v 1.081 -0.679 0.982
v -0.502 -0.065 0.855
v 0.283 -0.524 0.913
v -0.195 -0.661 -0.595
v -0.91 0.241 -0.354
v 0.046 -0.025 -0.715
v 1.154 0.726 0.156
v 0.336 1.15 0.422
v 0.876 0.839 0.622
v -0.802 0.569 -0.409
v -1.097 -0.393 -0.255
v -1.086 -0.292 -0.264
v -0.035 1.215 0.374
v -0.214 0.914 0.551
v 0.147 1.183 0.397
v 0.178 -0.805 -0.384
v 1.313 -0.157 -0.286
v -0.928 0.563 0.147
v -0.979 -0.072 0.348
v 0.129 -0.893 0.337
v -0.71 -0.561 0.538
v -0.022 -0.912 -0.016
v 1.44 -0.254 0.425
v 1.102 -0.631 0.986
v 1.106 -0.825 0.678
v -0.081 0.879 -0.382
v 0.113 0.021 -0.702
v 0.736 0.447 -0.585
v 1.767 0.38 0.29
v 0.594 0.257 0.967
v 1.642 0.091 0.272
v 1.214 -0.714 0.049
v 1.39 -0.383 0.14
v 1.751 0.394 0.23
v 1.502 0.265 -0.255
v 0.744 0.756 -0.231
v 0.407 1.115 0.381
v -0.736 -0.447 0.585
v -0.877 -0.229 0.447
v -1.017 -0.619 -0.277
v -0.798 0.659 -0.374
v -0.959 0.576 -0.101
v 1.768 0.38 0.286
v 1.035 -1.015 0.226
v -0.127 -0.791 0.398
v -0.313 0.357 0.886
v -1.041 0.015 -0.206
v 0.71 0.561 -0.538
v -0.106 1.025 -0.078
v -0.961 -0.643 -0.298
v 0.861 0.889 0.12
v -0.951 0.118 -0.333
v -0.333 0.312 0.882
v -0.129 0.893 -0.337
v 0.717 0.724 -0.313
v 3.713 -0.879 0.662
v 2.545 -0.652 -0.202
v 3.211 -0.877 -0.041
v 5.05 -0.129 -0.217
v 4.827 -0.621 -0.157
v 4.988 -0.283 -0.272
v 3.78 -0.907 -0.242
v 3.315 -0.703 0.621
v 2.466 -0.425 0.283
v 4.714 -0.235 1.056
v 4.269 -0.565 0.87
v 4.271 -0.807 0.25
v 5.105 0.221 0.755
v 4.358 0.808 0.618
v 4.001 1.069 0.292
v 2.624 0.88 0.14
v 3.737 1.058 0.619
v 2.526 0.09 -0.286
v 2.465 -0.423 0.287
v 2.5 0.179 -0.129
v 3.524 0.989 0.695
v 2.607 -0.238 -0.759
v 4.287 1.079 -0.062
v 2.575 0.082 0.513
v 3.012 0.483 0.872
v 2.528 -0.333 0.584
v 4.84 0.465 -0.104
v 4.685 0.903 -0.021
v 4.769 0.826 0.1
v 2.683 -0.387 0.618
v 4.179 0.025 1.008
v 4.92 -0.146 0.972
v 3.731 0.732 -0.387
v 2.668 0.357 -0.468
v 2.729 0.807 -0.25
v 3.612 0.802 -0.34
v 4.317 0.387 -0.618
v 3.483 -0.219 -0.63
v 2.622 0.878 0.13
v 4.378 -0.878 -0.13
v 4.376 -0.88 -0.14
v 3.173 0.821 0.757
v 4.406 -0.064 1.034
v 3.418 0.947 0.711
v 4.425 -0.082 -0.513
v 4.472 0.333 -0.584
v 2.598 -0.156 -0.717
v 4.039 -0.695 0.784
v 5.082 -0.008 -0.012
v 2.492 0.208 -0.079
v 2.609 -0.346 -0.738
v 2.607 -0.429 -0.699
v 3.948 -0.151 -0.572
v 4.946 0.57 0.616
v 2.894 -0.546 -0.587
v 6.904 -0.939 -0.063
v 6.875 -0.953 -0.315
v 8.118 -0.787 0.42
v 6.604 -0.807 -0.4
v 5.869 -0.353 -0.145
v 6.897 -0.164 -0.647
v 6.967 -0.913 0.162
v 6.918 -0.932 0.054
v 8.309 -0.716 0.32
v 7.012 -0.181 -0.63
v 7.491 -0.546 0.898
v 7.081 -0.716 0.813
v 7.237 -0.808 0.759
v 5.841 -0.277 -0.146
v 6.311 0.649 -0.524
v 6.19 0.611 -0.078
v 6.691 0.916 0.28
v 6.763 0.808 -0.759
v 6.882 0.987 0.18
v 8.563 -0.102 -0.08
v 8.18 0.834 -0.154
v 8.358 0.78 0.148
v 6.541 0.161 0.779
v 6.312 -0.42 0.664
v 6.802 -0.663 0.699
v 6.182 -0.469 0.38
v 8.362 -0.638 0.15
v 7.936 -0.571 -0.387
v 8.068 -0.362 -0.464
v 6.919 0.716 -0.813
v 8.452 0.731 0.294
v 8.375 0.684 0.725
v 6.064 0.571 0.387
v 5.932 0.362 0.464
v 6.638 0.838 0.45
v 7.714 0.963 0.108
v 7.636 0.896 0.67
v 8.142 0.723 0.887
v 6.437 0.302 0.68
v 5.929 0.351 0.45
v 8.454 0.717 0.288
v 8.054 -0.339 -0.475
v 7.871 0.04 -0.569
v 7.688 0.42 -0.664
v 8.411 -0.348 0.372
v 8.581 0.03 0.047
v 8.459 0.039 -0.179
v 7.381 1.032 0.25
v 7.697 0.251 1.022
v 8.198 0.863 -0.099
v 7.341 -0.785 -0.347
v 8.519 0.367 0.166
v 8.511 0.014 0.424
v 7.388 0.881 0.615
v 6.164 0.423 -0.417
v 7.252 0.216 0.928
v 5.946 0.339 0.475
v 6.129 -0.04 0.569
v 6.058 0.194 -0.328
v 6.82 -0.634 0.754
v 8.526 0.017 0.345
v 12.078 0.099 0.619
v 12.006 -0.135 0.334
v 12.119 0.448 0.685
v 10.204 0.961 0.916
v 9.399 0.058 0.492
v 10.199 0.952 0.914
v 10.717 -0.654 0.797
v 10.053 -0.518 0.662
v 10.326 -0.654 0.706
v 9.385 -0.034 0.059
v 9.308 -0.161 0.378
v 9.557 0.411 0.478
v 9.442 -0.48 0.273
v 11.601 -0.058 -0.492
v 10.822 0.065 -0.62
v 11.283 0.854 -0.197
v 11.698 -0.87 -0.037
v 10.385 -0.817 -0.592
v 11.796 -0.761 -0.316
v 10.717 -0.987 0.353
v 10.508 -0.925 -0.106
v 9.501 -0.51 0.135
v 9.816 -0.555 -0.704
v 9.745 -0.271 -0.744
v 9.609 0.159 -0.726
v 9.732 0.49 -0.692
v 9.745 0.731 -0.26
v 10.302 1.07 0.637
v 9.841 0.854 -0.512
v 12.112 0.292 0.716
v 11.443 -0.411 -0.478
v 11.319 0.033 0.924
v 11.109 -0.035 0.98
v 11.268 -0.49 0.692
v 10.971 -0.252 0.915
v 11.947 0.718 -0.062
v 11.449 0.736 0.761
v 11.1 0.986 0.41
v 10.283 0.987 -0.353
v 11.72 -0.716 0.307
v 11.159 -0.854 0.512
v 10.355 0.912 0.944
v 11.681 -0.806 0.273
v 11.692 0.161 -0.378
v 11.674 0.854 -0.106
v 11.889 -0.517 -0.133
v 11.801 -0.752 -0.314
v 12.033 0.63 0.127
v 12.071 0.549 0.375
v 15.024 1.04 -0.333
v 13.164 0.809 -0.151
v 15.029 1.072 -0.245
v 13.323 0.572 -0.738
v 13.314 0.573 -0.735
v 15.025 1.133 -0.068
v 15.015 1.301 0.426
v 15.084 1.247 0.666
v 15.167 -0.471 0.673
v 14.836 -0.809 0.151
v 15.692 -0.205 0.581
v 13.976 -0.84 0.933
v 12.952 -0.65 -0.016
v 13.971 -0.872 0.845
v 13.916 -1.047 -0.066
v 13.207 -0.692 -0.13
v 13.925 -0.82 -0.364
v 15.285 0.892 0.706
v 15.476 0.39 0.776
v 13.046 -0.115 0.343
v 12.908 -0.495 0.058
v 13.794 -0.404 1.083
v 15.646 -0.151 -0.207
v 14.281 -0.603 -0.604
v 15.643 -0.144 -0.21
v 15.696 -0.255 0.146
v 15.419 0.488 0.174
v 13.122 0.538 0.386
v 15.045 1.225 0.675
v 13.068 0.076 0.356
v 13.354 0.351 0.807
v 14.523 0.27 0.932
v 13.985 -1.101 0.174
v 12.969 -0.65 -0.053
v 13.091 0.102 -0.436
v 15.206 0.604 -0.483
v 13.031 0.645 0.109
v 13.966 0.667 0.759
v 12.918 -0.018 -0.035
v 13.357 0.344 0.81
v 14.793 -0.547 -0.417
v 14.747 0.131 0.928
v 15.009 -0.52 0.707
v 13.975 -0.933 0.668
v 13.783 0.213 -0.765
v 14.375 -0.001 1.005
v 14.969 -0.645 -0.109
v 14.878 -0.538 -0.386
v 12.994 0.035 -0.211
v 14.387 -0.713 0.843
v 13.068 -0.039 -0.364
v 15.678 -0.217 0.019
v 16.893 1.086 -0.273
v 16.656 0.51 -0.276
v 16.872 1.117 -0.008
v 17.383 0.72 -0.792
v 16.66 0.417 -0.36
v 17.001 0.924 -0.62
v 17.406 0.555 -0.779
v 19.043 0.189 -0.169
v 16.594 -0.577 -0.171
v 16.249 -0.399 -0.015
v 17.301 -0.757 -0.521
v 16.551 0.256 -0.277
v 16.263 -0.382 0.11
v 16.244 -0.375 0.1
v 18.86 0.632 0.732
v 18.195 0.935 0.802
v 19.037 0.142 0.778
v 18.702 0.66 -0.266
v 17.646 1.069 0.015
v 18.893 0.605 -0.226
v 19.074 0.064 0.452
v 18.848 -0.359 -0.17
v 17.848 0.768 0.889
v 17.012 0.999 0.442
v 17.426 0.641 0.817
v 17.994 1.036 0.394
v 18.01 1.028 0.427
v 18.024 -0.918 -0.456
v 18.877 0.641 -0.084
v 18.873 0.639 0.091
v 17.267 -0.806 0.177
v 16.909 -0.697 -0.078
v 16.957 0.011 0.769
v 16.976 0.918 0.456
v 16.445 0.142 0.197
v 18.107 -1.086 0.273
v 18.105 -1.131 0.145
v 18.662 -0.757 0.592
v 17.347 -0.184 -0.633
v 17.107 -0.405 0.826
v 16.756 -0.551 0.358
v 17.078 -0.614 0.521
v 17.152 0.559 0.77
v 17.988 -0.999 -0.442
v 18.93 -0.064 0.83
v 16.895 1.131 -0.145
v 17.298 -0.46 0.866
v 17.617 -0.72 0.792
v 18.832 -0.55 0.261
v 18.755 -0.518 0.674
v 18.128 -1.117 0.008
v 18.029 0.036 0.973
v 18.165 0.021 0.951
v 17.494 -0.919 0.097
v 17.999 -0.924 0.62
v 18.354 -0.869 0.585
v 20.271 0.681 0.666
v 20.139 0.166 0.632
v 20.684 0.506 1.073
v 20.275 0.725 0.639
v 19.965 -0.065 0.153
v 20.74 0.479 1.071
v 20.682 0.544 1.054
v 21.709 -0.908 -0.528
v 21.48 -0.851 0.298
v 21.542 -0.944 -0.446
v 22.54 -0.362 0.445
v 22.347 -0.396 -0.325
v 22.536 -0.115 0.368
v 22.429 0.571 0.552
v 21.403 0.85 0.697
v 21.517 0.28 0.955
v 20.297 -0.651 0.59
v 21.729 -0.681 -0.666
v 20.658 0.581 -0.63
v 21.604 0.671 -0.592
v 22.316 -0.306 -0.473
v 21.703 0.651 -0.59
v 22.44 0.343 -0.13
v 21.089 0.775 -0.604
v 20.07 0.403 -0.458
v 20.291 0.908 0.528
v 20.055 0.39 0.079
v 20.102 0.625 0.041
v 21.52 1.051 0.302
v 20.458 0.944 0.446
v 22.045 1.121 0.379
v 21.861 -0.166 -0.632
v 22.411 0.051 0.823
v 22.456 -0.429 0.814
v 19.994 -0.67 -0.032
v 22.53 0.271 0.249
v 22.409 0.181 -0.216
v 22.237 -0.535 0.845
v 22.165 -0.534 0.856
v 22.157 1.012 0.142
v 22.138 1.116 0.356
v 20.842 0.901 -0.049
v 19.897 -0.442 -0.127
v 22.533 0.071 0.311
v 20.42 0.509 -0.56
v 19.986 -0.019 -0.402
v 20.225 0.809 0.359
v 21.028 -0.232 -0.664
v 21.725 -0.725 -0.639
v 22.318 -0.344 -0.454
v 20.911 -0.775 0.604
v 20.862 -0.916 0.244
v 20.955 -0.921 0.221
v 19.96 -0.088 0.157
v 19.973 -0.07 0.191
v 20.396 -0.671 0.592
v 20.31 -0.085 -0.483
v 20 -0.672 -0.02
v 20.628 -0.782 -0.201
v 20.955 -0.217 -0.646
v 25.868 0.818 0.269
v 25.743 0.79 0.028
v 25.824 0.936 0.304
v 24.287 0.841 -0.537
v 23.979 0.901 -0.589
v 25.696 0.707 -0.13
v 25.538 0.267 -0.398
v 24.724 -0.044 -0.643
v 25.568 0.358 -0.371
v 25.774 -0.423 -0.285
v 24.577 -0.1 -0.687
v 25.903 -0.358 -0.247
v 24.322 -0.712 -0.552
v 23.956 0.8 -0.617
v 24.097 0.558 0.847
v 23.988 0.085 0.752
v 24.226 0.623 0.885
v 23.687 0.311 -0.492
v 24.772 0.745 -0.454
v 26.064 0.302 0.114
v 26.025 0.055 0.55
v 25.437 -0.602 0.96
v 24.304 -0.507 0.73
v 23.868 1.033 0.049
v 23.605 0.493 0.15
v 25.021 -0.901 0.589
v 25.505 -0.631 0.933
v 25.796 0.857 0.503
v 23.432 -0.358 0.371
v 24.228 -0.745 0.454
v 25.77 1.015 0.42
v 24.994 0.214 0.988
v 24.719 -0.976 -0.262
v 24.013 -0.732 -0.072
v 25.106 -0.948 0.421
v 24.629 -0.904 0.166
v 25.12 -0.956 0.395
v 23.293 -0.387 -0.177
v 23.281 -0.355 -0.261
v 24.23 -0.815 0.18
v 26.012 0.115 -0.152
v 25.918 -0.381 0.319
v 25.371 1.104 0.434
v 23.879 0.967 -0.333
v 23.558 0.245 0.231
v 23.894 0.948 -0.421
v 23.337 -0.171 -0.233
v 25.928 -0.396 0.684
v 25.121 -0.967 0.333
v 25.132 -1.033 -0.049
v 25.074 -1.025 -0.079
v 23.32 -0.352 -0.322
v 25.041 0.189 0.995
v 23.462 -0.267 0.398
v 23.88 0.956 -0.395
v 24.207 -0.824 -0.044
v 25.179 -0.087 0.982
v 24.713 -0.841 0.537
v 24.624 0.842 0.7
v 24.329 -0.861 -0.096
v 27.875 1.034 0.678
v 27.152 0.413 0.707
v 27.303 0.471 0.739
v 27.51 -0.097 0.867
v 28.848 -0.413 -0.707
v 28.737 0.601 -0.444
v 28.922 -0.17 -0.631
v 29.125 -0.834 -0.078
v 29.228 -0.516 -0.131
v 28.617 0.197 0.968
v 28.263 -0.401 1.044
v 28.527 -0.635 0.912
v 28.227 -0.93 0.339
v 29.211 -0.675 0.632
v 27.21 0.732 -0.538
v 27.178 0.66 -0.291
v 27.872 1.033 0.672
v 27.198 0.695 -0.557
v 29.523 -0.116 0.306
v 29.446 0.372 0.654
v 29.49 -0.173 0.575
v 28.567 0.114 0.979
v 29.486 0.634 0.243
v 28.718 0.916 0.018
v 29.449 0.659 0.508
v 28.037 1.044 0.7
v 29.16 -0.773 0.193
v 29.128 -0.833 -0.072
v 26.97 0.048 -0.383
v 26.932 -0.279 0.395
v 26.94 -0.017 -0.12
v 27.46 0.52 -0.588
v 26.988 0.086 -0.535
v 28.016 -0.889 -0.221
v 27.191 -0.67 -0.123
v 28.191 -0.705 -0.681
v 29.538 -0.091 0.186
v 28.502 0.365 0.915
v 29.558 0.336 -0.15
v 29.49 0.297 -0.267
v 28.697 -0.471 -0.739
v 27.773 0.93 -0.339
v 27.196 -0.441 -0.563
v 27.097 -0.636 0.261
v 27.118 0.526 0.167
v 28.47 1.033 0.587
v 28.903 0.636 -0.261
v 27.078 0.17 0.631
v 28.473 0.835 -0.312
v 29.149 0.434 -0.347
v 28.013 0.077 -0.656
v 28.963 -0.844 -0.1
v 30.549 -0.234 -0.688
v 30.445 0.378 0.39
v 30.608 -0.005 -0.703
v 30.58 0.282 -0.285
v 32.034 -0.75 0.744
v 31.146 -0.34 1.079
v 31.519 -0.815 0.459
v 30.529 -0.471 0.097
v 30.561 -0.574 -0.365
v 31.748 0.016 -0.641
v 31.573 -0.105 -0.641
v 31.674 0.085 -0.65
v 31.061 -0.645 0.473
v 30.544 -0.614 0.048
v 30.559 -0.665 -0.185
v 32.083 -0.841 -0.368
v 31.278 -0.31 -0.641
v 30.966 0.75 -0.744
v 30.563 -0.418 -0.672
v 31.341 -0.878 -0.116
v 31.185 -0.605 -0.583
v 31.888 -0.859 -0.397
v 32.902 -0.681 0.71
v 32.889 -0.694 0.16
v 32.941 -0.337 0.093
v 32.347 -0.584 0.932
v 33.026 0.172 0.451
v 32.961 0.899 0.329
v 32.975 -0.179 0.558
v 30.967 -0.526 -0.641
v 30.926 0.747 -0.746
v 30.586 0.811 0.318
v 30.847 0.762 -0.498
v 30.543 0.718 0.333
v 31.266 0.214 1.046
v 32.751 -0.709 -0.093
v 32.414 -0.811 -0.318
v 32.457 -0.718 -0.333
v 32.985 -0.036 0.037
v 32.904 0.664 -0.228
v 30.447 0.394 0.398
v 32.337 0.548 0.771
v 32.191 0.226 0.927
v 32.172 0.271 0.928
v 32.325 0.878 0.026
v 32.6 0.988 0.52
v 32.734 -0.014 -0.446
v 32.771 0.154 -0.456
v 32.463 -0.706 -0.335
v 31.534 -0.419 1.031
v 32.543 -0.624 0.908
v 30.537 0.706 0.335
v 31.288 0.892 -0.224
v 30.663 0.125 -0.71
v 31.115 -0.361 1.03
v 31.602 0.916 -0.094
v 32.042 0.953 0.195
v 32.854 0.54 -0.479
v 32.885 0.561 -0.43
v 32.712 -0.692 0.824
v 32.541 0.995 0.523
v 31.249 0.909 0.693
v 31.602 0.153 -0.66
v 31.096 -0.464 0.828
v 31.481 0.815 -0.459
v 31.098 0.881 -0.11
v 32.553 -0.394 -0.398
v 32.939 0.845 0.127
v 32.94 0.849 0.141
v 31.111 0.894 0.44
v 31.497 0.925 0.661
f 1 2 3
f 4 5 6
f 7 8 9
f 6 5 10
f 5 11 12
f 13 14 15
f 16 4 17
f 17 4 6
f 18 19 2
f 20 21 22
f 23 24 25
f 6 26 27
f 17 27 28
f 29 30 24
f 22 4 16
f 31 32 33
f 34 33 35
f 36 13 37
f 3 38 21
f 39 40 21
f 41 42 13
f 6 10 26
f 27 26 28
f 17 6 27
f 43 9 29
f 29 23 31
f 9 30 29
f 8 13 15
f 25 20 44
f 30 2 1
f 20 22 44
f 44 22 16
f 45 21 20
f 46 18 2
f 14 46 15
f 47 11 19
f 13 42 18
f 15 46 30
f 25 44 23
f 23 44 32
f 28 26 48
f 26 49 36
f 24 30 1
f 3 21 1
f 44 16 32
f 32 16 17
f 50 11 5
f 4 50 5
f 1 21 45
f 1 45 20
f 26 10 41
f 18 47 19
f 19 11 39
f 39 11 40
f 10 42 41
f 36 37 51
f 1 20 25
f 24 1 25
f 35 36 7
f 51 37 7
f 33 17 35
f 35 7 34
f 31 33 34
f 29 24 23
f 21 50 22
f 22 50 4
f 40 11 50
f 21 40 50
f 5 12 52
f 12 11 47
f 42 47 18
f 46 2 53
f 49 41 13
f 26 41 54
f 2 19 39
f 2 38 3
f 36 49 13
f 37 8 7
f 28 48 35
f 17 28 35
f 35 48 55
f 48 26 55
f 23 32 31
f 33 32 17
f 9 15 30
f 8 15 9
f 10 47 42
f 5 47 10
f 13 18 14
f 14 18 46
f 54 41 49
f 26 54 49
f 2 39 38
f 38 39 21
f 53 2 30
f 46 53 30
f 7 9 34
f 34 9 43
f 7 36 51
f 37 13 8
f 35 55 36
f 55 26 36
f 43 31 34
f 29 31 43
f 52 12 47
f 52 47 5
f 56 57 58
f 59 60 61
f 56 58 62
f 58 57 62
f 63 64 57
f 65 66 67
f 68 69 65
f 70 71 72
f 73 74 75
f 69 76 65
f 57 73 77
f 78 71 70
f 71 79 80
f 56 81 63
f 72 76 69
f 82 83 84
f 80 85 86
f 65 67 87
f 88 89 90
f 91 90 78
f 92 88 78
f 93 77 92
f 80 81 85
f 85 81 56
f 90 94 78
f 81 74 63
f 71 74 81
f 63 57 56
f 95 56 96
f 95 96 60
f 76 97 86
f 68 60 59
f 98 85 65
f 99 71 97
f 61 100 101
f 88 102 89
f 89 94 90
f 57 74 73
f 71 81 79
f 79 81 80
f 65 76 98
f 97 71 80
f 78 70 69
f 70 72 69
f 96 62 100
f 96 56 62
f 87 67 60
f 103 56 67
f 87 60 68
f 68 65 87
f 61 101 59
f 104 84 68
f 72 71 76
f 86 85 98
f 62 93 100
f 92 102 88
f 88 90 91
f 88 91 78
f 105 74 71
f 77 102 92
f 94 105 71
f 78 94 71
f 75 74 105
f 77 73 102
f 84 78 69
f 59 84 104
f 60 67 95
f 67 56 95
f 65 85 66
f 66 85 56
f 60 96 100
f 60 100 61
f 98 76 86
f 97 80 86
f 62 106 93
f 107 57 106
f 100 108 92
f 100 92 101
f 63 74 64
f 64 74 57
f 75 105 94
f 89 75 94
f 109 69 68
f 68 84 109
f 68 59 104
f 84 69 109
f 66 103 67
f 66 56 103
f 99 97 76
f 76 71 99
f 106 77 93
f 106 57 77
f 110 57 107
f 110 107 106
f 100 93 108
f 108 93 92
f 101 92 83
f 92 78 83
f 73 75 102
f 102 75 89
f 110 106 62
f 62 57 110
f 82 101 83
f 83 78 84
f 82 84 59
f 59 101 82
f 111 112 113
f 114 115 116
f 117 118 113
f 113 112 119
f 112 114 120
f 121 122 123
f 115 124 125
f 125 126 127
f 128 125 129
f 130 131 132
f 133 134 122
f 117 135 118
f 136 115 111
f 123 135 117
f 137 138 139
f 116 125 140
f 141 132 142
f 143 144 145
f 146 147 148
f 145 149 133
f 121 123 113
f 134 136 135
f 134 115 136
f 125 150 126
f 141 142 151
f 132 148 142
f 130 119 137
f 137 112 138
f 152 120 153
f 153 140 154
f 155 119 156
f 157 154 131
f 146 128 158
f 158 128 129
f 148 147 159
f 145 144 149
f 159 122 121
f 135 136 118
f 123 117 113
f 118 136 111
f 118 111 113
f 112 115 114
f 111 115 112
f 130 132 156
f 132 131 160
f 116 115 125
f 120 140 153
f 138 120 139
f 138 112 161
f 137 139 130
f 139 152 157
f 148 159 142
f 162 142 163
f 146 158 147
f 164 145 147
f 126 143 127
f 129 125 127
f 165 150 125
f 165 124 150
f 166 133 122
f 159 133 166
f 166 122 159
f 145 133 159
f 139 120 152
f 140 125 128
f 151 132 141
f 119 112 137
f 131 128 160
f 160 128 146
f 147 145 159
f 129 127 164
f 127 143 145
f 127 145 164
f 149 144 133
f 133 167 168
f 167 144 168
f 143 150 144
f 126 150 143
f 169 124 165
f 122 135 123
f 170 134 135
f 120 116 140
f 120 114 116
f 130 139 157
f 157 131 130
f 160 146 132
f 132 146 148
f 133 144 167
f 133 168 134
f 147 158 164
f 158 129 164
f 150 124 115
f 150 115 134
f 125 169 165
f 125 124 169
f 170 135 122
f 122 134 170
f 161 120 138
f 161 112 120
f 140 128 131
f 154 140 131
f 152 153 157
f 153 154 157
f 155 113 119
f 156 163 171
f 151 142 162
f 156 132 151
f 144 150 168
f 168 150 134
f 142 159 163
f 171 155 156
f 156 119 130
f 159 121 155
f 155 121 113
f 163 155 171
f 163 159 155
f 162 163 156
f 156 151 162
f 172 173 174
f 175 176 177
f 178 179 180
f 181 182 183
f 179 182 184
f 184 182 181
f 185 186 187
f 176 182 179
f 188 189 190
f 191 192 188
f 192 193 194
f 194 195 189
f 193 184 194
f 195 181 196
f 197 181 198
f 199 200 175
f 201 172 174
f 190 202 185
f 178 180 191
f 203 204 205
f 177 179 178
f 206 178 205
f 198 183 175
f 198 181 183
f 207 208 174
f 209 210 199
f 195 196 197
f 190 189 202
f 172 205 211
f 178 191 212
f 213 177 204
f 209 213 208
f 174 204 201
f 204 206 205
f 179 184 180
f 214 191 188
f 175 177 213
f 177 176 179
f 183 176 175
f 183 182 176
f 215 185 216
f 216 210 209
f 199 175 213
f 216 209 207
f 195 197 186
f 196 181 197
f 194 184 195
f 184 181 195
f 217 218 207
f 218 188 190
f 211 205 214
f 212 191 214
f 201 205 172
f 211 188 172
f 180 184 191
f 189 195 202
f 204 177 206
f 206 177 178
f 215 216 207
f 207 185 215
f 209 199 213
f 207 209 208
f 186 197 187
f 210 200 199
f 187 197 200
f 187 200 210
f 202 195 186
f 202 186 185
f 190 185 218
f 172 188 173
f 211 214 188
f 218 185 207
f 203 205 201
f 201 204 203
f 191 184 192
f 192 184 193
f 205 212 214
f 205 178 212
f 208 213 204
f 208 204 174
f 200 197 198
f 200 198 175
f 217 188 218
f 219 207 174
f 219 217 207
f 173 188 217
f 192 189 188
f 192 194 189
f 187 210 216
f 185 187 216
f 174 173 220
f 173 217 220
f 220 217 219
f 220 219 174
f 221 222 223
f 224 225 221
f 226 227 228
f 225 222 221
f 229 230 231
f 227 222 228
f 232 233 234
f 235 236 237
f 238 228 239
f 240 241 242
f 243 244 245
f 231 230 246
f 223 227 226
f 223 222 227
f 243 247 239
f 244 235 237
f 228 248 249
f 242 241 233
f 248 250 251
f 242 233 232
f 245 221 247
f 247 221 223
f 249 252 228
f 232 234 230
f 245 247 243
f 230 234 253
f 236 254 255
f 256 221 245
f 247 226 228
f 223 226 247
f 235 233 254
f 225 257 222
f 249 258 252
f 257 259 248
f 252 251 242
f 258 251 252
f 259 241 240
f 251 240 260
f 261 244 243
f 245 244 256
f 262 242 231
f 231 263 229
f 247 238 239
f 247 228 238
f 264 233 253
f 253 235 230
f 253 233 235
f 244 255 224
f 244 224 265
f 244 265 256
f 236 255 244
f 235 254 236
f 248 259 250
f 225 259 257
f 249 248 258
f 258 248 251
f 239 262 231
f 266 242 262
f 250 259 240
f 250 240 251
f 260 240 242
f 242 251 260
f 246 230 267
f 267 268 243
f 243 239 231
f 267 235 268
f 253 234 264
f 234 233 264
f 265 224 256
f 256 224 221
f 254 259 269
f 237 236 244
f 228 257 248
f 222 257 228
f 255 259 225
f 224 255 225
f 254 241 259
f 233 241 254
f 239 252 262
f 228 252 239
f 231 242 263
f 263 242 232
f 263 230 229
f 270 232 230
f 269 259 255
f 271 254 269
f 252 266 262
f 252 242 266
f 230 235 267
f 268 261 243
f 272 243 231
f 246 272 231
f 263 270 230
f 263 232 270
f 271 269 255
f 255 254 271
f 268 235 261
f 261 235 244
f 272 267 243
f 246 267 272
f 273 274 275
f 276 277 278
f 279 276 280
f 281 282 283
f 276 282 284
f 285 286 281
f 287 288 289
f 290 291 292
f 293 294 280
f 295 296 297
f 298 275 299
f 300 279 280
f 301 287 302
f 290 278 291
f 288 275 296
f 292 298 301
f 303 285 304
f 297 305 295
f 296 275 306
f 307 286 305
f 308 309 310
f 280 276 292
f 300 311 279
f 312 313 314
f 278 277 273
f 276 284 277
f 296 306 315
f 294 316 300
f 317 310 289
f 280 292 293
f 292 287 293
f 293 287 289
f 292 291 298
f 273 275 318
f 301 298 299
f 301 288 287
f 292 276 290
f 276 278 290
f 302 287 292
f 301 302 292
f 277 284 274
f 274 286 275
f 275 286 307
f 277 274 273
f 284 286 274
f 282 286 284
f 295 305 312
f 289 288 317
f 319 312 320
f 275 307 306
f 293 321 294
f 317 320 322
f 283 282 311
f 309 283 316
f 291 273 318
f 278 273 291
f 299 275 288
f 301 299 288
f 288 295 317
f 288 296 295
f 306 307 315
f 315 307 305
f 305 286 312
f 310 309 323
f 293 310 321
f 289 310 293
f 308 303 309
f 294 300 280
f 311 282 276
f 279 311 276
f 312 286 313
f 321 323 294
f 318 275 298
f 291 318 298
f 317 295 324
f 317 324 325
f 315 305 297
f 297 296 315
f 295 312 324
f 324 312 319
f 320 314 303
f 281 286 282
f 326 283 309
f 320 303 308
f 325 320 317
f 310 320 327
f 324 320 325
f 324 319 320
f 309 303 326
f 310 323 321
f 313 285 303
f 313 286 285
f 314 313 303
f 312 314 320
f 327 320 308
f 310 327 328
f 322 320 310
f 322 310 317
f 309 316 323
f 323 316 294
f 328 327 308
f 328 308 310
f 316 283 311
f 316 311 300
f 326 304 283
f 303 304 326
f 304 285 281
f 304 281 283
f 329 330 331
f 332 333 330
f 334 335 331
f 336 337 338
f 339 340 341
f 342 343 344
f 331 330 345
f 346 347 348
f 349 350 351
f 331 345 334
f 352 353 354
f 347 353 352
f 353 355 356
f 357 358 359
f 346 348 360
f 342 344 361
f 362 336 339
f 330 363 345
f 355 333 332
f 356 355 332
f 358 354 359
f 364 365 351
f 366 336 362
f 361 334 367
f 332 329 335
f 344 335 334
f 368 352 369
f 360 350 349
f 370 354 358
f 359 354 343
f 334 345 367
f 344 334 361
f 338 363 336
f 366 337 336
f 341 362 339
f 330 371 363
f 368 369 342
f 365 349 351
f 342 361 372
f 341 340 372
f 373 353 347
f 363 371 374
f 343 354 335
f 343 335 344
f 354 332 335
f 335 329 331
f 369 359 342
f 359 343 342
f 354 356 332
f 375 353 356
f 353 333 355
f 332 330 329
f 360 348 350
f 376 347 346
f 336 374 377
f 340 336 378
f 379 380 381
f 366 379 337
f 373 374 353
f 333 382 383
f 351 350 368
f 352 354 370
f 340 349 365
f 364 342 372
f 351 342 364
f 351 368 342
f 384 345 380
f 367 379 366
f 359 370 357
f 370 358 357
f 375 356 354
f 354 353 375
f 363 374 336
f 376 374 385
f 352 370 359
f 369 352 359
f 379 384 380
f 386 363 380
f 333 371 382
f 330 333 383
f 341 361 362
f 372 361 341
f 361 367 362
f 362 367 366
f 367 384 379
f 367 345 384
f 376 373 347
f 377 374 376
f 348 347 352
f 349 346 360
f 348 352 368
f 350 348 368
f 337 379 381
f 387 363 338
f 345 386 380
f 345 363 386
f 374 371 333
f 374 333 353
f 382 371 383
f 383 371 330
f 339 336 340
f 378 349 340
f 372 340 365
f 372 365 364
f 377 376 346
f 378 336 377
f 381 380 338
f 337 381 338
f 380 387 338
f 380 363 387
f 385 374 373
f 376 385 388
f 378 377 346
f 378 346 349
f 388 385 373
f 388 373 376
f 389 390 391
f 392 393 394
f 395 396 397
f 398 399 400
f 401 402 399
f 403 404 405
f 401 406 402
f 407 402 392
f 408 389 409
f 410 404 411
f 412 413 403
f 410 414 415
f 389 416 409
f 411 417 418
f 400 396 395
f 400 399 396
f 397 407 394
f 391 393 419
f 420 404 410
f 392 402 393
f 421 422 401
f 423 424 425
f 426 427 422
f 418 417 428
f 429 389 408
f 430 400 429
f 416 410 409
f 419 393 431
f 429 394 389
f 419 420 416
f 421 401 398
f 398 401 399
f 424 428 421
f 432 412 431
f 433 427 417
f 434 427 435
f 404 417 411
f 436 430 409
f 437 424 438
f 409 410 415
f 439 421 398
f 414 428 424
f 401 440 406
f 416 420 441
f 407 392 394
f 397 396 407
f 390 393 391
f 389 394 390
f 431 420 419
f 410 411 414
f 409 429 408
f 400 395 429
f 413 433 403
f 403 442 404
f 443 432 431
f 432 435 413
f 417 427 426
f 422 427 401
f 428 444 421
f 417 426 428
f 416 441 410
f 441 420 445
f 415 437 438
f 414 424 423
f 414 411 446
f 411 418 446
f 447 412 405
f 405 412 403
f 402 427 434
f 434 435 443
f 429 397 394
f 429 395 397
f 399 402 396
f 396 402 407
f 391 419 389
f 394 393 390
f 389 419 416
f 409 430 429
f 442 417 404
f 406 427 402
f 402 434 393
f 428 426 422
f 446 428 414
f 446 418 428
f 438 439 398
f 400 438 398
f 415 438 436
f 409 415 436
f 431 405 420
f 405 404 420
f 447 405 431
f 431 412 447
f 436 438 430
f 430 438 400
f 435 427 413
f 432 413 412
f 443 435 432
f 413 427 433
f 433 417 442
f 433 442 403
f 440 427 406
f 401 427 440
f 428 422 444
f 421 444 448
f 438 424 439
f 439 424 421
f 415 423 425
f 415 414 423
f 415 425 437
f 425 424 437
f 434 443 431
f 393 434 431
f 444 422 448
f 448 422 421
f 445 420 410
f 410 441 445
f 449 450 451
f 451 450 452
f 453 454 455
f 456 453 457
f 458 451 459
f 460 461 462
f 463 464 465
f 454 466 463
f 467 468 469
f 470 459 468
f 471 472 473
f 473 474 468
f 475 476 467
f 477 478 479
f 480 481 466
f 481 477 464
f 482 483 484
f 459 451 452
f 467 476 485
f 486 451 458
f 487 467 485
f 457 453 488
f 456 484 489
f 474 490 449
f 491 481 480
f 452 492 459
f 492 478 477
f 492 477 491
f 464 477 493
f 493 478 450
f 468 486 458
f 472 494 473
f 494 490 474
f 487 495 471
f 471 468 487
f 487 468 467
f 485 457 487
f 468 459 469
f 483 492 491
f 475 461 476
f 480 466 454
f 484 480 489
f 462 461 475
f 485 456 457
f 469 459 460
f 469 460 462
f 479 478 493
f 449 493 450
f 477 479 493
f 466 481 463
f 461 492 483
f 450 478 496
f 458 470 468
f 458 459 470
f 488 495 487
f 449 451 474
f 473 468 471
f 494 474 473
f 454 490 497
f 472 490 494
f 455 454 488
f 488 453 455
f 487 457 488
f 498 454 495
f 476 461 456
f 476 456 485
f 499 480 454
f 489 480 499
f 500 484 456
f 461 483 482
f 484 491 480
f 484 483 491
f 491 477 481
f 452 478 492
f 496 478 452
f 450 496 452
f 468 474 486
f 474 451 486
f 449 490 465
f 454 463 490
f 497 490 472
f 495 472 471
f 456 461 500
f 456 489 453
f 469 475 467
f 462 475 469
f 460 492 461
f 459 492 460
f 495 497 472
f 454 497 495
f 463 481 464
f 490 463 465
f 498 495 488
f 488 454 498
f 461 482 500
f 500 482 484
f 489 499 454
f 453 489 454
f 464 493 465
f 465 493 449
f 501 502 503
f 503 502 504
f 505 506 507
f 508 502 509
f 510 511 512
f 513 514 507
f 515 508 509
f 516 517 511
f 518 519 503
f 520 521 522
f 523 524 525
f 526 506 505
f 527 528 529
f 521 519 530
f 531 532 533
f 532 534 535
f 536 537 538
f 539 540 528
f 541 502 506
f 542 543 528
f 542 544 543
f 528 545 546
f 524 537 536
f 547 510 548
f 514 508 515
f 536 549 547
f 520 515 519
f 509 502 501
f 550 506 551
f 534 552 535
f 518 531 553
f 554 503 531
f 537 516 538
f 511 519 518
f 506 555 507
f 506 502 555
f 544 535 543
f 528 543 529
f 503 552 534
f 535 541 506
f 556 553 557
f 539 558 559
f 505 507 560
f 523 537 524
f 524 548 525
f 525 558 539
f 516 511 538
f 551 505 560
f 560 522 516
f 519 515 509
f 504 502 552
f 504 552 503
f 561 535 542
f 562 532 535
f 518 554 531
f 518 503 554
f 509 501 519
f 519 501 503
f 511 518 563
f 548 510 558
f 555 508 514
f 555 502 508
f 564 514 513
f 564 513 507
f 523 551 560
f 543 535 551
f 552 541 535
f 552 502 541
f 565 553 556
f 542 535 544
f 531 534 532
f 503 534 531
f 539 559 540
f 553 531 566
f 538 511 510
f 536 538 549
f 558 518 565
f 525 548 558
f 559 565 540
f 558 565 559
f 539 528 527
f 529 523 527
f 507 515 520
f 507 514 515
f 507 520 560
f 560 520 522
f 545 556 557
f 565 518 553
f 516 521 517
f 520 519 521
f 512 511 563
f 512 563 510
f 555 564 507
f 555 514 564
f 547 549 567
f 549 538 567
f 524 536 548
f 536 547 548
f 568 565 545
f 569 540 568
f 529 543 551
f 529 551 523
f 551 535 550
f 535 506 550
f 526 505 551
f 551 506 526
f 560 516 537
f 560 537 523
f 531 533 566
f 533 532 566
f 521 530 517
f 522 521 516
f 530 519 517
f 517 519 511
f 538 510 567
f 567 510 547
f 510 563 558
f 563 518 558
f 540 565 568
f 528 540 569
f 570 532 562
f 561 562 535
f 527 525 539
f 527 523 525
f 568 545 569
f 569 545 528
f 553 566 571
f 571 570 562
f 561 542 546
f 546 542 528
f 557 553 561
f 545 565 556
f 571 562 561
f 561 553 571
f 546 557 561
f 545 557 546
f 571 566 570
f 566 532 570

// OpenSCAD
//Customizable Stone Wall
//Created by Ari M. Diacou, January 2014 (updated February, 2014)
//Shared under Creative Commons License: Attribution-ShareAlike 3.0 Unported (CC BY-SA 3.0) 
//see http://creativecommons.org/licenses/by-sa/3.0/

// preview[view:south east, tilt:side]
/*[Wall]*/
//Length of a stone
U=2;
//Thickness of wall
V=1.7;
//Height of a stone
W=1.3;
//A way to save the arrangement of stones
master_seed=14;
//Higher angles make more wedge-shaped stones, lower angles produce blocks. Reccomend 5-30 (zero crashes).
maximum_rotation_angle=30;
//Higher rotation angles might need more compression
z_compression=0.9;
//Number of cubes that make up a block
n=3; 
//A way to reduce the abilty of higher n to chop up a block (should be -2 to 0)
power=0;

/*[Hidden]*/
dimensions=[U,V,W];

for (i=[0:9]) {
   translate([3.5*i,0,0]) hull() {
      rock(dimensions,maximum_rotation_angle,i* master_seed);
      translate([0.5,0.1,0.3]) rock(dimensions,maximum_rotation_angle,i* master_seed+3);
   }
}

module rock(unit_dimension, max_rotation, seed){
	random=rands(-1,1,n*3,seed);
		intersection(){
			intersection_for(i=[0:n-1]){
				rotate([	max_rotation*random[3*i+0]*pow(i,power),
							max_rotation*random[3*i+1]*pow(i,power),
							max_rotation*random[3*i+2]*pow(i,power)])
					cube(unit_dimension, center=true);
					}
			}	
	}
